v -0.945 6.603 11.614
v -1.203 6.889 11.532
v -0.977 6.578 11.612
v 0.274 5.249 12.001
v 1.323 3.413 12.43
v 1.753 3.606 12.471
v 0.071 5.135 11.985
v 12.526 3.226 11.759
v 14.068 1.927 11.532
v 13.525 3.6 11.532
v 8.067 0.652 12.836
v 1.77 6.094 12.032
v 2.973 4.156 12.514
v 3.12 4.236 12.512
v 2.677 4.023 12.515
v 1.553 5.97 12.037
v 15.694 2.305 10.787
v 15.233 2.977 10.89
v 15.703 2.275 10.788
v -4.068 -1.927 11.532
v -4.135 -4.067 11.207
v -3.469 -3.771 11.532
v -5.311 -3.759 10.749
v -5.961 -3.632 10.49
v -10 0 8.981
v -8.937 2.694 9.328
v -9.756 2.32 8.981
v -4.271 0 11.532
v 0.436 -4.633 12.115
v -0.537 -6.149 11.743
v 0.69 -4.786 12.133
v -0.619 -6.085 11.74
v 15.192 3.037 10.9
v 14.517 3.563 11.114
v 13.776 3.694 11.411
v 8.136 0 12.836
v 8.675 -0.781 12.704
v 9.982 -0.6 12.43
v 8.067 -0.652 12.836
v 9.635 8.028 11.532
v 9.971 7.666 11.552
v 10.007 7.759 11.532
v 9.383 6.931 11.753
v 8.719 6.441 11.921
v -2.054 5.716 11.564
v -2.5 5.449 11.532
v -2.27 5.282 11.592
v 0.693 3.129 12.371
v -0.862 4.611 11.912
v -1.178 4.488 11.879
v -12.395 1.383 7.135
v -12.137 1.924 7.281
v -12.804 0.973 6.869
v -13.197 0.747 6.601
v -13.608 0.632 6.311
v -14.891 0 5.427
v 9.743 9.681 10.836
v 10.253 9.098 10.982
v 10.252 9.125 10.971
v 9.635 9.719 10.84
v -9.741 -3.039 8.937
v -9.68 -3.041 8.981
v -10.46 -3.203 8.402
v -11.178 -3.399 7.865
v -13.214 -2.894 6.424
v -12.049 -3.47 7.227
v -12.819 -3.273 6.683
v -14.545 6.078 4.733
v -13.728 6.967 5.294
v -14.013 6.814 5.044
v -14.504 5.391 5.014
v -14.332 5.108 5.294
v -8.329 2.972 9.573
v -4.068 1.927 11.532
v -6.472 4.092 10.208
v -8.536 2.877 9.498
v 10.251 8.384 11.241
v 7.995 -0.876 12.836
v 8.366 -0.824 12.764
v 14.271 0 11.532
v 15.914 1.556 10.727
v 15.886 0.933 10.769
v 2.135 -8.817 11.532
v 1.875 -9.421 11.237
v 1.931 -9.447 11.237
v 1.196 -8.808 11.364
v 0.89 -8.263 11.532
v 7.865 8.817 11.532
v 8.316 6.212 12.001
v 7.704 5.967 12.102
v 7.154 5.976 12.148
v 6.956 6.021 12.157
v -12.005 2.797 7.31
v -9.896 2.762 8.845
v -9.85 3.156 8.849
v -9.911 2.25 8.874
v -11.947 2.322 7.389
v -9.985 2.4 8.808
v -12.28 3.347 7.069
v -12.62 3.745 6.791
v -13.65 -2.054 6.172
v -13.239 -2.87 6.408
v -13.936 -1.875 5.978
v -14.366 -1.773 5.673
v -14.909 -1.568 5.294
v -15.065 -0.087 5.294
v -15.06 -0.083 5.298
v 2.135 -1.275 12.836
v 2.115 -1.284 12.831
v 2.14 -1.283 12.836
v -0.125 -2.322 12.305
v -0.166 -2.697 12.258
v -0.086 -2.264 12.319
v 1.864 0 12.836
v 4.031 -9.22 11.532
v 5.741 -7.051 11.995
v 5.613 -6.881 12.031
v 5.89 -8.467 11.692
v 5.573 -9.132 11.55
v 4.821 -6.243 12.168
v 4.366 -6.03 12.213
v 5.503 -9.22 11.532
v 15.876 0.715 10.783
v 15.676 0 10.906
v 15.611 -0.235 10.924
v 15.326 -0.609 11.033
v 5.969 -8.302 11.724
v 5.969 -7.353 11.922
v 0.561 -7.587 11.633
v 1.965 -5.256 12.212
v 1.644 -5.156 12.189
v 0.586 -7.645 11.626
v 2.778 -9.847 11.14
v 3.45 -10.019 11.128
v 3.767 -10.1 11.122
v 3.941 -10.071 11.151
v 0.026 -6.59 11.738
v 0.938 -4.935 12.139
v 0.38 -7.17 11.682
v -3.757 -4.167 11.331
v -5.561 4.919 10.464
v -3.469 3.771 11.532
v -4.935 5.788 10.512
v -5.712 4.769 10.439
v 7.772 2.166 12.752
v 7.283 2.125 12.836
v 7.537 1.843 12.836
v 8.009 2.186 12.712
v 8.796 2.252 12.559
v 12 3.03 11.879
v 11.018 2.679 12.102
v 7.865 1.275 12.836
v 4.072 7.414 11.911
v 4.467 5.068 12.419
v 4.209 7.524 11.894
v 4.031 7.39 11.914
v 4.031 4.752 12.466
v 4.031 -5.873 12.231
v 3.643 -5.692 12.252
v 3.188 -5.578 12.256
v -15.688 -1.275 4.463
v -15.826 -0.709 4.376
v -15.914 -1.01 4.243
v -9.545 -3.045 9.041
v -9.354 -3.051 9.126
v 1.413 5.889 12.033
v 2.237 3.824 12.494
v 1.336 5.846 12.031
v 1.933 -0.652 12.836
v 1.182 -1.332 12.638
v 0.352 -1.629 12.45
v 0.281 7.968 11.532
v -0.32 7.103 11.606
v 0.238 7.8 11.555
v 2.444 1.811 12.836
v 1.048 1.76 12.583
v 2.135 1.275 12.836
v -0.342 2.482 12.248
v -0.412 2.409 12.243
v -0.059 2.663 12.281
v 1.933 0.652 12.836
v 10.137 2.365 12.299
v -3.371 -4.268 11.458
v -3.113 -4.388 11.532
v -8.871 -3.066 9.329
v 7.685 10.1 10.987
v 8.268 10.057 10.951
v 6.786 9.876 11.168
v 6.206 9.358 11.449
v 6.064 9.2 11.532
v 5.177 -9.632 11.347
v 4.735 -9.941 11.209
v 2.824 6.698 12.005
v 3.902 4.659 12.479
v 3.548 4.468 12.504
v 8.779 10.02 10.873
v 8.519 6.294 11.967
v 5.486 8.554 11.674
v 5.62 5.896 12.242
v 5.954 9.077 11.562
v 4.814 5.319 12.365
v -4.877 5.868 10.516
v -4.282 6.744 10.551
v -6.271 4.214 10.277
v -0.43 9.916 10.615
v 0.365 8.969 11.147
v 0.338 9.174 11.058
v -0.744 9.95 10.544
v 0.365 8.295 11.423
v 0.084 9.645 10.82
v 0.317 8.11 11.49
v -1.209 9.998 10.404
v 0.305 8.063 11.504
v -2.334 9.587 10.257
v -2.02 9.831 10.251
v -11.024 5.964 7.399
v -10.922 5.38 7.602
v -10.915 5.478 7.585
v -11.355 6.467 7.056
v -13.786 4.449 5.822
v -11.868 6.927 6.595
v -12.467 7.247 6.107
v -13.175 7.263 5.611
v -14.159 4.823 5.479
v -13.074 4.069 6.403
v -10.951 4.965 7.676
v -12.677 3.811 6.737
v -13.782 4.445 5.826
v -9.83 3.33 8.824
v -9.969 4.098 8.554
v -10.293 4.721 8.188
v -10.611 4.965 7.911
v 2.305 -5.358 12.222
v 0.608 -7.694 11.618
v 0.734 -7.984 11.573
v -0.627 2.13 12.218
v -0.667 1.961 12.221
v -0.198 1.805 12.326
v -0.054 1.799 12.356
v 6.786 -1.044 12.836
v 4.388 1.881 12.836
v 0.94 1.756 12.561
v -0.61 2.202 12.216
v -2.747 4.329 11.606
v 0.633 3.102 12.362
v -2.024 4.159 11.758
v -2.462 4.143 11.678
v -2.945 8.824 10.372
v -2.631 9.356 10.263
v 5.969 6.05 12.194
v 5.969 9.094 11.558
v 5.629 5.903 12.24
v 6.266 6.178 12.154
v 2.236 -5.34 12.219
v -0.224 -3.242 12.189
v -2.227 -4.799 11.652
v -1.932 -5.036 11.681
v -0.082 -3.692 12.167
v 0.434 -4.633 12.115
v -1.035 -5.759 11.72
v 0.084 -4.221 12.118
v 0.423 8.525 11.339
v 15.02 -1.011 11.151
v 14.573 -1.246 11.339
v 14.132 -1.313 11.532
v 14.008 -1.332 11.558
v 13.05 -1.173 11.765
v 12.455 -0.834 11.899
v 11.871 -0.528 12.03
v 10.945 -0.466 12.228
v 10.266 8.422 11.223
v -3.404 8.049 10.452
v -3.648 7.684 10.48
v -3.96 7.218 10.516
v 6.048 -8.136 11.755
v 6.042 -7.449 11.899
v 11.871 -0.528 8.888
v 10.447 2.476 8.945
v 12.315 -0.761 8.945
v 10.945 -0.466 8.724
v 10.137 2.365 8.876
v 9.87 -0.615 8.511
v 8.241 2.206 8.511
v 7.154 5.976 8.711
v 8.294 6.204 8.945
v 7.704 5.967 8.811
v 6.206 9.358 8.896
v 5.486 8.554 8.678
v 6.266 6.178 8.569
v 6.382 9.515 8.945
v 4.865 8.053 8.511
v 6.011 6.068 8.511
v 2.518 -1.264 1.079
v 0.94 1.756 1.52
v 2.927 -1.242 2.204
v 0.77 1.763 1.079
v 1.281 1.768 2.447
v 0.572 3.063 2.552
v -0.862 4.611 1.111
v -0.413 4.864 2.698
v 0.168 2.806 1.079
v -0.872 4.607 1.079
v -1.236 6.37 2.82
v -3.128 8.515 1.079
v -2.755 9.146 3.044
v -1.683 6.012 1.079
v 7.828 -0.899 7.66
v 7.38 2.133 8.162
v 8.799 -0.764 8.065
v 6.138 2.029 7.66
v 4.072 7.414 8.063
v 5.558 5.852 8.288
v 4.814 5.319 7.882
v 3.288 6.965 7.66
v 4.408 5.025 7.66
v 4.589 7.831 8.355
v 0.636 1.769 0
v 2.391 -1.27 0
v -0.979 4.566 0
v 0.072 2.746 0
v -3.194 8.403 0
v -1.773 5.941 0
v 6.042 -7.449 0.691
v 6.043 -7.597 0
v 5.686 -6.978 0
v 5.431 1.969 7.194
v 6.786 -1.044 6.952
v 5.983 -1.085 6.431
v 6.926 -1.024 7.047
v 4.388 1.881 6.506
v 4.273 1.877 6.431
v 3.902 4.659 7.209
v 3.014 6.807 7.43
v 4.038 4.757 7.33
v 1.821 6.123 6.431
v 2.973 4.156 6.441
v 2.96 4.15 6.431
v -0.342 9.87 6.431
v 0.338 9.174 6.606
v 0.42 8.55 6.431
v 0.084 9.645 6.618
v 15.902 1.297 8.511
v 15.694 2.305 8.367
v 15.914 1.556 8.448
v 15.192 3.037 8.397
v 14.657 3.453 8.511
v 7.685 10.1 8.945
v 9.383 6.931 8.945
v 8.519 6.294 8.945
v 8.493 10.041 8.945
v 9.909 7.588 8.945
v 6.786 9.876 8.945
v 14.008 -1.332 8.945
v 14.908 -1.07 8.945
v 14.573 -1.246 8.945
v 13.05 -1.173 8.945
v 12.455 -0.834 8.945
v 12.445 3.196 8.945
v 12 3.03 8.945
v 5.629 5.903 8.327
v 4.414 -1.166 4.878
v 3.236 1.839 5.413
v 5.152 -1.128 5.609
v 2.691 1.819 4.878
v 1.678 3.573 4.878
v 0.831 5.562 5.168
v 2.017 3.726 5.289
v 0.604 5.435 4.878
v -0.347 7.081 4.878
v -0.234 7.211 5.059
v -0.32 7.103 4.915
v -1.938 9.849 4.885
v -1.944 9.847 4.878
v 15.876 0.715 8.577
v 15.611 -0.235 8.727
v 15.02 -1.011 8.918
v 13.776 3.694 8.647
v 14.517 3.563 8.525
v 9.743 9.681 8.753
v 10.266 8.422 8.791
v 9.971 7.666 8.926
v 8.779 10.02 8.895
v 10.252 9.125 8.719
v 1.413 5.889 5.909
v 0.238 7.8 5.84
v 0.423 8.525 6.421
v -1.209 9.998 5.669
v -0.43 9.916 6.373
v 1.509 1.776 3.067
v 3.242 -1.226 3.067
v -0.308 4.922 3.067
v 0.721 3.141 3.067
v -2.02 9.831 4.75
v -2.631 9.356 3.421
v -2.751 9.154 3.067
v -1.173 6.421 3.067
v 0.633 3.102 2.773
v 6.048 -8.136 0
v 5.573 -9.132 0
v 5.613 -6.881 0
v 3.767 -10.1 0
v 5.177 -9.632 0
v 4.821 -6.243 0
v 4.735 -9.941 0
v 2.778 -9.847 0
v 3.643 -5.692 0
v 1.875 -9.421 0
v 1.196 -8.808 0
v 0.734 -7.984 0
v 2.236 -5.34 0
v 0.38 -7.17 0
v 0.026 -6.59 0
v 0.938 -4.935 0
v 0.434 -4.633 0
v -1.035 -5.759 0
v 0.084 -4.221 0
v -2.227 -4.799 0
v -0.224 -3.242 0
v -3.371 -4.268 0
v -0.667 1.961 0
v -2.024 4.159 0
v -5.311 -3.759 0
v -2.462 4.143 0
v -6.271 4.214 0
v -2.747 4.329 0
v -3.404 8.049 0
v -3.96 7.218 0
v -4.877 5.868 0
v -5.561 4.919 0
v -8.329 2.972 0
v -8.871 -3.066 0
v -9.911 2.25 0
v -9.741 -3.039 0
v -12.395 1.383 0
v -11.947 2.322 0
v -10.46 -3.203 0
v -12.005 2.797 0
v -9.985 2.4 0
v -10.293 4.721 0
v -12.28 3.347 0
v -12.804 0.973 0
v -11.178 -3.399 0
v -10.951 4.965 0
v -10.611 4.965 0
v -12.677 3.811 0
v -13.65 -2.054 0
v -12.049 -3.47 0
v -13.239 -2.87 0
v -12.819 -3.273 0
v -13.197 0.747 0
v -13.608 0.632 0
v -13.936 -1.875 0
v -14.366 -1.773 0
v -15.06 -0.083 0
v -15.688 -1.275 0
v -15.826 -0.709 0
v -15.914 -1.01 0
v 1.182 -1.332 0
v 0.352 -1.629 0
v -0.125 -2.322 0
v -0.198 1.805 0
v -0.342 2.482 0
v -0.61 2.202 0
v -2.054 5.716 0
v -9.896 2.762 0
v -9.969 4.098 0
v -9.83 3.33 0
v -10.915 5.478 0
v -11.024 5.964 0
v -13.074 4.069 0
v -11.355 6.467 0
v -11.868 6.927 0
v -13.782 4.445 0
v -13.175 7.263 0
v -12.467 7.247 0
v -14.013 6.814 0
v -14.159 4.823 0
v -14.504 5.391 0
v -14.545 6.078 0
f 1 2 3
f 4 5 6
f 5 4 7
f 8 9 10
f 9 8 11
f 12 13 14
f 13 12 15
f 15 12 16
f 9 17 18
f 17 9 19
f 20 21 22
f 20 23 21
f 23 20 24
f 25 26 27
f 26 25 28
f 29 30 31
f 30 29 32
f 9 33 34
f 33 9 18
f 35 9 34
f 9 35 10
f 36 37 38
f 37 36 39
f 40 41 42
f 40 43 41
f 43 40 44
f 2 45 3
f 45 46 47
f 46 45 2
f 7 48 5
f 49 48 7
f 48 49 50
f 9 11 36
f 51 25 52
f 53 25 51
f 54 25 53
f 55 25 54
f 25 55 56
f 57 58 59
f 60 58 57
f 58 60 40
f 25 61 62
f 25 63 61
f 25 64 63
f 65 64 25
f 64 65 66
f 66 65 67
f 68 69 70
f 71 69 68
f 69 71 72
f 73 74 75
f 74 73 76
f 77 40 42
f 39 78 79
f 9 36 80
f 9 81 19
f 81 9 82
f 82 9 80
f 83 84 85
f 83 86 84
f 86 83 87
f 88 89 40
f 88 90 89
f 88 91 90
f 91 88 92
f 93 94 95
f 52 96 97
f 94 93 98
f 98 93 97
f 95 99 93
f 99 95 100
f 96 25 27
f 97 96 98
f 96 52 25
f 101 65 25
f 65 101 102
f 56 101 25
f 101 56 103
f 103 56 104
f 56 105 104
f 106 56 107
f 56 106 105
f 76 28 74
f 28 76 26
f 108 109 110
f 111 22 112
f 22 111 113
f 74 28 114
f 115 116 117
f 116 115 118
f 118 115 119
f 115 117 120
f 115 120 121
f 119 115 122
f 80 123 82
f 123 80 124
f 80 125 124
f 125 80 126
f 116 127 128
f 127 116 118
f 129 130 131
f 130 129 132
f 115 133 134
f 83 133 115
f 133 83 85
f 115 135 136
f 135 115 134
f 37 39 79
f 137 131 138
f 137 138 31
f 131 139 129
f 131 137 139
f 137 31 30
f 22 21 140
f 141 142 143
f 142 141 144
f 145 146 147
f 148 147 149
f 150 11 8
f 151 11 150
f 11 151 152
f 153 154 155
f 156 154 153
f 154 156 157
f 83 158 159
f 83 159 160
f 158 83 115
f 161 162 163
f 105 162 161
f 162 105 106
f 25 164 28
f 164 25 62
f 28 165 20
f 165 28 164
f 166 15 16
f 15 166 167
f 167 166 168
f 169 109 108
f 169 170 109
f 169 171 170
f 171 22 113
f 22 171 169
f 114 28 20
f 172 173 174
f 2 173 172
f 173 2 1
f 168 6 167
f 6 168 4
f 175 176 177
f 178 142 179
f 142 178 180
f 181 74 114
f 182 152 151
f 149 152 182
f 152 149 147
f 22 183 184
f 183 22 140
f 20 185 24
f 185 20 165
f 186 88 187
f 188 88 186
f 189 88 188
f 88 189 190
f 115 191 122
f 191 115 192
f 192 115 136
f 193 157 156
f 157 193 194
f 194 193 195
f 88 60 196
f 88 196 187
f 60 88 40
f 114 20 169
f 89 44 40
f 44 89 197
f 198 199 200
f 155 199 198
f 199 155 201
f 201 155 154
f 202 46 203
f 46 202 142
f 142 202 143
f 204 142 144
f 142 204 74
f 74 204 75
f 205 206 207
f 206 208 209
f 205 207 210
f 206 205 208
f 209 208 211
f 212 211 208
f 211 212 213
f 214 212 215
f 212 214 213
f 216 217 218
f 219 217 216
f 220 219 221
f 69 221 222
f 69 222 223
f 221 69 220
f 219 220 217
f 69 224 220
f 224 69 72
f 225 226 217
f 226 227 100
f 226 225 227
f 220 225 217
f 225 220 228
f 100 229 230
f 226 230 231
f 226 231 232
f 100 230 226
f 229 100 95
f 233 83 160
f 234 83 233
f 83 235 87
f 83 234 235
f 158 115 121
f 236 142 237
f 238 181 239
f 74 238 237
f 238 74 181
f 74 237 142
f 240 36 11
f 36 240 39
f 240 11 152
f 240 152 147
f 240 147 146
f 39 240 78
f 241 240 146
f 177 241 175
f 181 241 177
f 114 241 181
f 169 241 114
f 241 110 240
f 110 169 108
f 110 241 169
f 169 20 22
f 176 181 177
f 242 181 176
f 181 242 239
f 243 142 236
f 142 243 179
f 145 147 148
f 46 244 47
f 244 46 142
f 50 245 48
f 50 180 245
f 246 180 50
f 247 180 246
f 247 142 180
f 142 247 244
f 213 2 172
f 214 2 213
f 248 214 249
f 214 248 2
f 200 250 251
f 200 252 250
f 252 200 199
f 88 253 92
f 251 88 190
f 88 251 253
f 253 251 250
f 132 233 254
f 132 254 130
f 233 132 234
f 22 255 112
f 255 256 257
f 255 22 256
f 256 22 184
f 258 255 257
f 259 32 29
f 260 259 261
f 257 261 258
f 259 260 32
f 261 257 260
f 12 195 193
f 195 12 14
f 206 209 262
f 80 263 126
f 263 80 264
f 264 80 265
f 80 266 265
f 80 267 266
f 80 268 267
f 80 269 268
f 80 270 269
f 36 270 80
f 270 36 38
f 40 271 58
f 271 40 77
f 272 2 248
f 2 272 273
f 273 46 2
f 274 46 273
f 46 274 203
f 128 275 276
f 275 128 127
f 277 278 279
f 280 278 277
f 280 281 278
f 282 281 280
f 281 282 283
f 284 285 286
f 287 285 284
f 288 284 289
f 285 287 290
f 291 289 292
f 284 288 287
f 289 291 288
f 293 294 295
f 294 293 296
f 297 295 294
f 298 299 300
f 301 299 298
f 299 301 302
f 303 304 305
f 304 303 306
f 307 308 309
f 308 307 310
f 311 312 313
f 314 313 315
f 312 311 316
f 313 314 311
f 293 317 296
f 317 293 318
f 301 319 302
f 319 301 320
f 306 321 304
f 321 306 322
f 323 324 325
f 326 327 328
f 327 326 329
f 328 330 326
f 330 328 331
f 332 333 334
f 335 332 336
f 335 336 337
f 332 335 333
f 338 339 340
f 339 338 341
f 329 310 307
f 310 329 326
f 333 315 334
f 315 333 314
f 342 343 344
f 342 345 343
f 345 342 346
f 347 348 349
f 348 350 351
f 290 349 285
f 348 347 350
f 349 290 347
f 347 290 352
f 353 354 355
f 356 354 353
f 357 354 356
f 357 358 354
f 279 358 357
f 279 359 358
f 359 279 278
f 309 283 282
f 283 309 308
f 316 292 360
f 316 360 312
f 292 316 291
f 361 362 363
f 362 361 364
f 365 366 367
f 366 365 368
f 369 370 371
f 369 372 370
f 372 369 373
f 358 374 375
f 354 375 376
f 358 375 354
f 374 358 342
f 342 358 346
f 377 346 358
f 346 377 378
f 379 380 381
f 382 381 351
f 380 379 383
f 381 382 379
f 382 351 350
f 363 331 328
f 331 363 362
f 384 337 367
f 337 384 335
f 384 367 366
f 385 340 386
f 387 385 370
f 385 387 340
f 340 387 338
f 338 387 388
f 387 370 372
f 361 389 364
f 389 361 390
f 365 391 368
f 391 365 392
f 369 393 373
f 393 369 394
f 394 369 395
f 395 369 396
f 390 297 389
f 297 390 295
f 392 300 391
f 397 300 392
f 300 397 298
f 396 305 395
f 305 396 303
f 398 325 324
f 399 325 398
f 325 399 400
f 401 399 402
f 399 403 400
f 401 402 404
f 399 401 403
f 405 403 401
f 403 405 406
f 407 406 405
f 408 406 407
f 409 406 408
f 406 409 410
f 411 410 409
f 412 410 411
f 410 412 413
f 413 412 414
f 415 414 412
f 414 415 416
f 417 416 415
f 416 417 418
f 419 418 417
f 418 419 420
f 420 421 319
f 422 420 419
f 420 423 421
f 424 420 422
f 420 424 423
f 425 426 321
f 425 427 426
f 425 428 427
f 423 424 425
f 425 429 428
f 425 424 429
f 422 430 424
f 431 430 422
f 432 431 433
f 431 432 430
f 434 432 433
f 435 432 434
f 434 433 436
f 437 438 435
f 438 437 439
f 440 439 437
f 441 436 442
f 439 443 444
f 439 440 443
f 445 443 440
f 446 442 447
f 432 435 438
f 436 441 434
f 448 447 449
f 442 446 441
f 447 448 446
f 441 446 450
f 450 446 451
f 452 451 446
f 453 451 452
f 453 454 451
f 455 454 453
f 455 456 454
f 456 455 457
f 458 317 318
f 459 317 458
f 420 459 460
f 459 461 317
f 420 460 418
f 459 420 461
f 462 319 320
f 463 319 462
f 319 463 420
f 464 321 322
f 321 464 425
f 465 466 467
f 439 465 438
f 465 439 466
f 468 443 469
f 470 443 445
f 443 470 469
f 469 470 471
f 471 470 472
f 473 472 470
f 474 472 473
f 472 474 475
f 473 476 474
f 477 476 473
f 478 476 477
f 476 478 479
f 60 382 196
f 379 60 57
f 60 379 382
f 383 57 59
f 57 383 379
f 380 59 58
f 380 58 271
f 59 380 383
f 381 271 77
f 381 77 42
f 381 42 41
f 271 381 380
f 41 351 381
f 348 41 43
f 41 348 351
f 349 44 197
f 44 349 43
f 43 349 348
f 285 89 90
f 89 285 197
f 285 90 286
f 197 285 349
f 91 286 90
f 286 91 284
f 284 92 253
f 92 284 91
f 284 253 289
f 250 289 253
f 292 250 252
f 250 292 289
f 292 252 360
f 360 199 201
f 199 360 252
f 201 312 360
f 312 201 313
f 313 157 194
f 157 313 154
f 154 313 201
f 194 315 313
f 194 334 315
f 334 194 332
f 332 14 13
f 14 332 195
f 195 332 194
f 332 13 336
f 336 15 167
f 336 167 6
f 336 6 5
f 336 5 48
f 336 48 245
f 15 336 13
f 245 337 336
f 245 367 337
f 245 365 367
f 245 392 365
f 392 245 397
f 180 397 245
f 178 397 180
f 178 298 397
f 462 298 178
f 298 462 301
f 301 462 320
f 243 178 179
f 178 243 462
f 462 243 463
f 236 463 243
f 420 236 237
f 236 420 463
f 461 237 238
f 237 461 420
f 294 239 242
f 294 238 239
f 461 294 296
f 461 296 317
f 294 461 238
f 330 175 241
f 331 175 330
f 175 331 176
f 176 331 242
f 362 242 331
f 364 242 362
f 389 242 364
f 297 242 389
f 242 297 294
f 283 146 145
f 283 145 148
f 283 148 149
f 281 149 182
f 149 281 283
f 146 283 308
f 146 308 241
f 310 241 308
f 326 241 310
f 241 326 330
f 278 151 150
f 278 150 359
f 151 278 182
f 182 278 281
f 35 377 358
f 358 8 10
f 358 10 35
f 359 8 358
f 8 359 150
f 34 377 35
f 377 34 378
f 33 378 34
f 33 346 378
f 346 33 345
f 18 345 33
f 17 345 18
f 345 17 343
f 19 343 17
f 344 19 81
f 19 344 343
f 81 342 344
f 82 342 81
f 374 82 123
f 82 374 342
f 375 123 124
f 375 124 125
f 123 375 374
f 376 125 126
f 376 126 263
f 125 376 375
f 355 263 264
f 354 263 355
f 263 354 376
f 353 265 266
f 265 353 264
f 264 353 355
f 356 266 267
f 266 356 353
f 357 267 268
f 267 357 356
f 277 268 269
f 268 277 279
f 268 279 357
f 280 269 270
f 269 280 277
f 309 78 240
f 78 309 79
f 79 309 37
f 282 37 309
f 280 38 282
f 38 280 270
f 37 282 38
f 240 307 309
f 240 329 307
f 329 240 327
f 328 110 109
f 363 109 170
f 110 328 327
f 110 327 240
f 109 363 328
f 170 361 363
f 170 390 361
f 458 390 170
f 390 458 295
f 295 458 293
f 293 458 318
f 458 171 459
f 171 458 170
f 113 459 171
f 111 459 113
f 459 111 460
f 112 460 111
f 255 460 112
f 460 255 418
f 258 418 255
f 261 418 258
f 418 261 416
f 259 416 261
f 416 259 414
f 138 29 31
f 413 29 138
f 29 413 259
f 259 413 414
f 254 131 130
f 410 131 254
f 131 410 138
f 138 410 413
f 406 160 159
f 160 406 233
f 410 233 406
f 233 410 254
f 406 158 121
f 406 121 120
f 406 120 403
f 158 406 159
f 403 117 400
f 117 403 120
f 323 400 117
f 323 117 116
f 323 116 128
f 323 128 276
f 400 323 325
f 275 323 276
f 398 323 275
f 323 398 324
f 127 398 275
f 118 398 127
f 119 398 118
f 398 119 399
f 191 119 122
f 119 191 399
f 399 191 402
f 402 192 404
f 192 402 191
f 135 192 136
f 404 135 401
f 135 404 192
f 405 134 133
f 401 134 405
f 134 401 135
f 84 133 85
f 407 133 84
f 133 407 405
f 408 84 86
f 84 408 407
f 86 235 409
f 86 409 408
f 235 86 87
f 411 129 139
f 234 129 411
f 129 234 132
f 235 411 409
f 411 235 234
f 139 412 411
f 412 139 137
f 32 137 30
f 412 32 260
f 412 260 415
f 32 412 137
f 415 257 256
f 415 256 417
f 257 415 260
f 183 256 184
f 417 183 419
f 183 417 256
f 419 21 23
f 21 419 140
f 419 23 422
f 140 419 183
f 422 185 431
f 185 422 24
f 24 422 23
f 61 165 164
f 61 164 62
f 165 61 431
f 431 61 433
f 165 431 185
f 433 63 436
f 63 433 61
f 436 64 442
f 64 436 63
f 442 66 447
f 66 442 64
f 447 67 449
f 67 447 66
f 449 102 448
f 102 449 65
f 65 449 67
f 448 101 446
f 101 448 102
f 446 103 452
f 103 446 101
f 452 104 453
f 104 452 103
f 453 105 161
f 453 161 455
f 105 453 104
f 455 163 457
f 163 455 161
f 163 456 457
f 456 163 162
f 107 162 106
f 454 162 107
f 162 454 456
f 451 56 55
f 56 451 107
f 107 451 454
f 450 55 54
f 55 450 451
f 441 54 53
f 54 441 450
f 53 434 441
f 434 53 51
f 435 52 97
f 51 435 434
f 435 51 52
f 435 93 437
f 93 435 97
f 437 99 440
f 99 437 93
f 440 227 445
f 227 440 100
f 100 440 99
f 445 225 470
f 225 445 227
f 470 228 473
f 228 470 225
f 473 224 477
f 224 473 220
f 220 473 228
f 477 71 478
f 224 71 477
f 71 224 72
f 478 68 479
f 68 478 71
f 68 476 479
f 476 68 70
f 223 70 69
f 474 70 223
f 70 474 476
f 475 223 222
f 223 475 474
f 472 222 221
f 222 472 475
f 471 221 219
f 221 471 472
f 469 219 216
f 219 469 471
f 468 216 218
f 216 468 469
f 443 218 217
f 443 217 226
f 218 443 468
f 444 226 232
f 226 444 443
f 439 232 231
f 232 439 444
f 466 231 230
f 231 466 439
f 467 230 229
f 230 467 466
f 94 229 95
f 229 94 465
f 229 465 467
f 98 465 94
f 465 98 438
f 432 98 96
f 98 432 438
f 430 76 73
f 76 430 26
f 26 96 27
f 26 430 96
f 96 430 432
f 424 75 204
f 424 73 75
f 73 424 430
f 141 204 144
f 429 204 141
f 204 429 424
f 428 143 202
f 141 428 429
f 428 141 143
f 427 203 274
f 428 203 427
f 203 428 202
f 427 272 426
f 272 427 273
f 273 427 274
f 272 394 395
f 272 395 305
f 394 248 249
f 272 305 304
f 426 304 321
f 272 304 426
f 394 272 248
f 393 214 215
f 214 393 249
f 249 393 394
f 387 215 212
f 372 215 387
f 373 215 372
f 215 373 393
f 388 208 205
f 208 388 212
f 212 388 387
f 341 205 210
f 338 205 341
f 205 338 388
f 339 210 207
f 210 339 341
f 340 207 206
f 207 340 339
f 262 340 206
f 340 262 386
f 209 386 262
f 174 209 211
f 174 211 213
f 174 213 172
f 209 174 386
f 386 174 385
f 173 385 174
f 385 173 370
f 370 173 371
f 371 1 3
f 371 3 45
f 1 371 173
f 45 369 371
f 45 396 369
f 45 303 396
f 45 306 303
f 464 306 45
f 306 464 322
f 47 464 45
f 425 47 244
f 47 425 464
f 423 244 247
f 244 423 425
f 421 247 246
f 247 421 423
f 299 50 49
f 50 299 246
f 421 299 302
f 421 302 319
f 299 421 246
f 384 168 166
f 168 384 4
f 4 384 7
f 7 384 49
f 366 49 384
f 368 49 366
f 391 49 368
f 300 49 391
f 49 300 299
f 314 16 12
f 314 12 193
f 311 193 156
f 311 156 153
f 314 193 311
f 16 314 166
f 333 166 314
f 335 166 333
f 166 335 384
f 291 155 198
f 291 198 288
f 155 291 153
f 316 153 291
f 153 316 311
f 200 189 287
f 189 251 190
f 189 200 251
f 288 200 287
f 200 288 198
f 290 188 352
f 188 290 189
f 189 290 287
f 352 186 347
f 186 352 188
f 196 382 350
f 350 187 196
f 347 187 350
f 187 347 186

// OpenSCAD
// file: toes.scad
// Generated by inkscape 0.92.5 (2060ec1f9f, 2020-04-08) + inkscape-paths2openscad 0.25
// Sat Dec 25 16:41:48 2021 from "cabletoes.svg"

// Module names are of the form poly_<inkscape-path-id>().  As a result,
// you can associate a polygon in this OpenSCAD program with the corresponding
// SVG element in the Inkscape document by looking for the XML element with
// the attribute id="inkscape-path-id".

// fudge value is used to ensure that subtracted solids are a tad taller
// in the z dimension than the polygon being subtracted from.  This helps
// keep the resulting .stl file manifold.
fudge = 0.1;
zsize = 20;
line_fn = 4;
min_line_width = 1.0;
line_width_scale = 1.0;
function min_line_mm(w) = max(min_line_width, w * line_width_scale) * 96/25.4;


path8176_0_center = [-0.000000,-0.000000];
path8176_0_points = [[-51.433337,-2.388288],[-56.919584,0.313894],[-59.816240,2.678300],[-60.147616,3.818281],[-59.294229,4.817522],[-54.296878,6.699259],[-52.672889,7.087107],[-51.592286,7.762152],[-50.038896,10.848060],[-48.448927,12.370847],[-45.537671,13.115132],[-42.248654,12.845593],[-39.532827,12.105222],[-36.817000,11.487679],[-33.527983,11.586622],[-20.071666,14.206916],[-12.739614,16.131196],[-8.416808,18.137362],[-3.913173,21.767564],[0.099156,24.906462],[1.436599,27.100277],[2.774044,30.174347],[4.520910,33.289361],[7.086616,35.606002],[10.498460,37.216398],[14.237841,38.171715],[17.895338,37.571228],[19.565435,36.406082],[21.061526,34.514212],[22.859571,30.750951],[22.835690,28.154540],[21.215065,26.008492],[18.222876,23.596322],[13.767009,21.511683],[8.451354,20.184475],[3.545119,18.652558],[1.642163,17.509165],[0.317516,15.953792],[-0.845924,12.251935],[-0.474031,8.775264],[1.330838,6.158379],[4.466326,5.035882],[25.647046,3.944092],[41.368816,1.760502],[44.865960,1.995923],[47.073425,3.152541],[49.321831,4.431985],[52.941796,5.035882],[55.078466,4.710051],[56.769890,3.821266],[59.001238,0.887080],[60.004320,-2.702183],[60.147616,-5.882028],[59.315126,-8.710443],[57.418141,-11.477448],[54.866084,-13.466553],[52.068376,-13.961268],[45.353859,-11.450151],[38.311816,-8.939028],[16.585188,-7.110284],[3.551942,-6.636039],[-0.748689,-6.822411],[-2.521144,-7.410528],[-2.306196,-8.322343],[-1.292876,-9.382573],[2.391919,-11.723098],[11.235416,-15.708128],[14.746204,-17.608528],[18.195579,-20.102588],[21.276474,-22.310049],[23.681826,-23.350658],[27.039083,-22.586409],[29.116894,-22.552291],[32.197786,-23.787378],[35.462923,-26.196143],[37.684034,-28.973387],[38.799708,-31.832513],[38.748536,-34.486928],[36.824252,-36.588619],[33.180400,-37.871472],[29.045244,-38.171715],[25.647046,-37.325578],[23.456641,-35.370591],[20.733989,-32.330637],[15.391043,-28.021478],[5.339756,-22.258878],[-3.258097,-17.427706],[-7.649141,-15.718371],[-9.303458,-15.658236],[-10.382027,-16.363208],[-7.761729,-21.603798],[-1.210994,-26.844398],[0.900941,-29.481748],[1.600371,-32.221457],[1.276246,-34.674574],[0.317516,-36.452148],[-1.623824,-37.479111],[-4.568245,-37.789589],[-7.635492,-37.158399],[-9.945311,-35.360358],[-12.865850,-30.420013],[-14.967545,-27.281108],[-18.433979,-22.176989],[-21.016747,-18.591139],[-23.701870,-15.926488],[-31.480872,-11.231794],[-37.458423,-8.502318],[-37.738196,-9.072096],[-37.403835,-10.440244],[-37.151358,-12.586294],[-37.676784,-15.489778],[-38.901635,-17.843948],[-40.106015,-18.765143],[-41.388869,-18.765138],[-41.252395,-20.703070],[-41.665227,-22.542058],[-42.917373,-24.442458],[-44.855302,-26.182498],[-47.120767,-27.390290],[-49.795653,-27.451703],[-52.961847,-25.752608],[-54.974834,-22.971952],[-54.817889,-20.375536],[-53.514564,-18.229486],[-52.088415,-16.799928],[-49.413525,-15.380595],[-47.912313,-14.404805],[-46.411103,-12.651118],[-45.373903,-10.569895],[-45.155546,-8.775266],[-46.847820,-5.226948],[-48.393384,-3.677968],[-49.877536,-2.825005],[-51.433337,-2.388288],[-51.433337,-2.388288]];
module poly_path8176(h, w, s, res=line_fn)
{
  scale([25.4/96, -25.4/96, 1]) union()
  {
    translate (path8176_0_center) linear_extrude(height=h, convexity=10, scale=0.01*s)
      translate (-path8176_0_center) polygon(path8176_0_points);
  }
}

module toes(h)
{
  difference()
  {
    union()
    {
      translate ([0,0,0]) poly_path8176(h, min_line_mm(0.158813373), 100.0);
    }
    union()
    {
    }
  }
}

toes(zsize);
// main file
module toes(){
include<toes.scad>;
}

intersection(){
    difference(){
        translate([5,0,-17]) sphere(30);
        translate([5,14,-1]) rotate([90,0,30]) cylinder(r=10, h=28);

    }
toes();
}
